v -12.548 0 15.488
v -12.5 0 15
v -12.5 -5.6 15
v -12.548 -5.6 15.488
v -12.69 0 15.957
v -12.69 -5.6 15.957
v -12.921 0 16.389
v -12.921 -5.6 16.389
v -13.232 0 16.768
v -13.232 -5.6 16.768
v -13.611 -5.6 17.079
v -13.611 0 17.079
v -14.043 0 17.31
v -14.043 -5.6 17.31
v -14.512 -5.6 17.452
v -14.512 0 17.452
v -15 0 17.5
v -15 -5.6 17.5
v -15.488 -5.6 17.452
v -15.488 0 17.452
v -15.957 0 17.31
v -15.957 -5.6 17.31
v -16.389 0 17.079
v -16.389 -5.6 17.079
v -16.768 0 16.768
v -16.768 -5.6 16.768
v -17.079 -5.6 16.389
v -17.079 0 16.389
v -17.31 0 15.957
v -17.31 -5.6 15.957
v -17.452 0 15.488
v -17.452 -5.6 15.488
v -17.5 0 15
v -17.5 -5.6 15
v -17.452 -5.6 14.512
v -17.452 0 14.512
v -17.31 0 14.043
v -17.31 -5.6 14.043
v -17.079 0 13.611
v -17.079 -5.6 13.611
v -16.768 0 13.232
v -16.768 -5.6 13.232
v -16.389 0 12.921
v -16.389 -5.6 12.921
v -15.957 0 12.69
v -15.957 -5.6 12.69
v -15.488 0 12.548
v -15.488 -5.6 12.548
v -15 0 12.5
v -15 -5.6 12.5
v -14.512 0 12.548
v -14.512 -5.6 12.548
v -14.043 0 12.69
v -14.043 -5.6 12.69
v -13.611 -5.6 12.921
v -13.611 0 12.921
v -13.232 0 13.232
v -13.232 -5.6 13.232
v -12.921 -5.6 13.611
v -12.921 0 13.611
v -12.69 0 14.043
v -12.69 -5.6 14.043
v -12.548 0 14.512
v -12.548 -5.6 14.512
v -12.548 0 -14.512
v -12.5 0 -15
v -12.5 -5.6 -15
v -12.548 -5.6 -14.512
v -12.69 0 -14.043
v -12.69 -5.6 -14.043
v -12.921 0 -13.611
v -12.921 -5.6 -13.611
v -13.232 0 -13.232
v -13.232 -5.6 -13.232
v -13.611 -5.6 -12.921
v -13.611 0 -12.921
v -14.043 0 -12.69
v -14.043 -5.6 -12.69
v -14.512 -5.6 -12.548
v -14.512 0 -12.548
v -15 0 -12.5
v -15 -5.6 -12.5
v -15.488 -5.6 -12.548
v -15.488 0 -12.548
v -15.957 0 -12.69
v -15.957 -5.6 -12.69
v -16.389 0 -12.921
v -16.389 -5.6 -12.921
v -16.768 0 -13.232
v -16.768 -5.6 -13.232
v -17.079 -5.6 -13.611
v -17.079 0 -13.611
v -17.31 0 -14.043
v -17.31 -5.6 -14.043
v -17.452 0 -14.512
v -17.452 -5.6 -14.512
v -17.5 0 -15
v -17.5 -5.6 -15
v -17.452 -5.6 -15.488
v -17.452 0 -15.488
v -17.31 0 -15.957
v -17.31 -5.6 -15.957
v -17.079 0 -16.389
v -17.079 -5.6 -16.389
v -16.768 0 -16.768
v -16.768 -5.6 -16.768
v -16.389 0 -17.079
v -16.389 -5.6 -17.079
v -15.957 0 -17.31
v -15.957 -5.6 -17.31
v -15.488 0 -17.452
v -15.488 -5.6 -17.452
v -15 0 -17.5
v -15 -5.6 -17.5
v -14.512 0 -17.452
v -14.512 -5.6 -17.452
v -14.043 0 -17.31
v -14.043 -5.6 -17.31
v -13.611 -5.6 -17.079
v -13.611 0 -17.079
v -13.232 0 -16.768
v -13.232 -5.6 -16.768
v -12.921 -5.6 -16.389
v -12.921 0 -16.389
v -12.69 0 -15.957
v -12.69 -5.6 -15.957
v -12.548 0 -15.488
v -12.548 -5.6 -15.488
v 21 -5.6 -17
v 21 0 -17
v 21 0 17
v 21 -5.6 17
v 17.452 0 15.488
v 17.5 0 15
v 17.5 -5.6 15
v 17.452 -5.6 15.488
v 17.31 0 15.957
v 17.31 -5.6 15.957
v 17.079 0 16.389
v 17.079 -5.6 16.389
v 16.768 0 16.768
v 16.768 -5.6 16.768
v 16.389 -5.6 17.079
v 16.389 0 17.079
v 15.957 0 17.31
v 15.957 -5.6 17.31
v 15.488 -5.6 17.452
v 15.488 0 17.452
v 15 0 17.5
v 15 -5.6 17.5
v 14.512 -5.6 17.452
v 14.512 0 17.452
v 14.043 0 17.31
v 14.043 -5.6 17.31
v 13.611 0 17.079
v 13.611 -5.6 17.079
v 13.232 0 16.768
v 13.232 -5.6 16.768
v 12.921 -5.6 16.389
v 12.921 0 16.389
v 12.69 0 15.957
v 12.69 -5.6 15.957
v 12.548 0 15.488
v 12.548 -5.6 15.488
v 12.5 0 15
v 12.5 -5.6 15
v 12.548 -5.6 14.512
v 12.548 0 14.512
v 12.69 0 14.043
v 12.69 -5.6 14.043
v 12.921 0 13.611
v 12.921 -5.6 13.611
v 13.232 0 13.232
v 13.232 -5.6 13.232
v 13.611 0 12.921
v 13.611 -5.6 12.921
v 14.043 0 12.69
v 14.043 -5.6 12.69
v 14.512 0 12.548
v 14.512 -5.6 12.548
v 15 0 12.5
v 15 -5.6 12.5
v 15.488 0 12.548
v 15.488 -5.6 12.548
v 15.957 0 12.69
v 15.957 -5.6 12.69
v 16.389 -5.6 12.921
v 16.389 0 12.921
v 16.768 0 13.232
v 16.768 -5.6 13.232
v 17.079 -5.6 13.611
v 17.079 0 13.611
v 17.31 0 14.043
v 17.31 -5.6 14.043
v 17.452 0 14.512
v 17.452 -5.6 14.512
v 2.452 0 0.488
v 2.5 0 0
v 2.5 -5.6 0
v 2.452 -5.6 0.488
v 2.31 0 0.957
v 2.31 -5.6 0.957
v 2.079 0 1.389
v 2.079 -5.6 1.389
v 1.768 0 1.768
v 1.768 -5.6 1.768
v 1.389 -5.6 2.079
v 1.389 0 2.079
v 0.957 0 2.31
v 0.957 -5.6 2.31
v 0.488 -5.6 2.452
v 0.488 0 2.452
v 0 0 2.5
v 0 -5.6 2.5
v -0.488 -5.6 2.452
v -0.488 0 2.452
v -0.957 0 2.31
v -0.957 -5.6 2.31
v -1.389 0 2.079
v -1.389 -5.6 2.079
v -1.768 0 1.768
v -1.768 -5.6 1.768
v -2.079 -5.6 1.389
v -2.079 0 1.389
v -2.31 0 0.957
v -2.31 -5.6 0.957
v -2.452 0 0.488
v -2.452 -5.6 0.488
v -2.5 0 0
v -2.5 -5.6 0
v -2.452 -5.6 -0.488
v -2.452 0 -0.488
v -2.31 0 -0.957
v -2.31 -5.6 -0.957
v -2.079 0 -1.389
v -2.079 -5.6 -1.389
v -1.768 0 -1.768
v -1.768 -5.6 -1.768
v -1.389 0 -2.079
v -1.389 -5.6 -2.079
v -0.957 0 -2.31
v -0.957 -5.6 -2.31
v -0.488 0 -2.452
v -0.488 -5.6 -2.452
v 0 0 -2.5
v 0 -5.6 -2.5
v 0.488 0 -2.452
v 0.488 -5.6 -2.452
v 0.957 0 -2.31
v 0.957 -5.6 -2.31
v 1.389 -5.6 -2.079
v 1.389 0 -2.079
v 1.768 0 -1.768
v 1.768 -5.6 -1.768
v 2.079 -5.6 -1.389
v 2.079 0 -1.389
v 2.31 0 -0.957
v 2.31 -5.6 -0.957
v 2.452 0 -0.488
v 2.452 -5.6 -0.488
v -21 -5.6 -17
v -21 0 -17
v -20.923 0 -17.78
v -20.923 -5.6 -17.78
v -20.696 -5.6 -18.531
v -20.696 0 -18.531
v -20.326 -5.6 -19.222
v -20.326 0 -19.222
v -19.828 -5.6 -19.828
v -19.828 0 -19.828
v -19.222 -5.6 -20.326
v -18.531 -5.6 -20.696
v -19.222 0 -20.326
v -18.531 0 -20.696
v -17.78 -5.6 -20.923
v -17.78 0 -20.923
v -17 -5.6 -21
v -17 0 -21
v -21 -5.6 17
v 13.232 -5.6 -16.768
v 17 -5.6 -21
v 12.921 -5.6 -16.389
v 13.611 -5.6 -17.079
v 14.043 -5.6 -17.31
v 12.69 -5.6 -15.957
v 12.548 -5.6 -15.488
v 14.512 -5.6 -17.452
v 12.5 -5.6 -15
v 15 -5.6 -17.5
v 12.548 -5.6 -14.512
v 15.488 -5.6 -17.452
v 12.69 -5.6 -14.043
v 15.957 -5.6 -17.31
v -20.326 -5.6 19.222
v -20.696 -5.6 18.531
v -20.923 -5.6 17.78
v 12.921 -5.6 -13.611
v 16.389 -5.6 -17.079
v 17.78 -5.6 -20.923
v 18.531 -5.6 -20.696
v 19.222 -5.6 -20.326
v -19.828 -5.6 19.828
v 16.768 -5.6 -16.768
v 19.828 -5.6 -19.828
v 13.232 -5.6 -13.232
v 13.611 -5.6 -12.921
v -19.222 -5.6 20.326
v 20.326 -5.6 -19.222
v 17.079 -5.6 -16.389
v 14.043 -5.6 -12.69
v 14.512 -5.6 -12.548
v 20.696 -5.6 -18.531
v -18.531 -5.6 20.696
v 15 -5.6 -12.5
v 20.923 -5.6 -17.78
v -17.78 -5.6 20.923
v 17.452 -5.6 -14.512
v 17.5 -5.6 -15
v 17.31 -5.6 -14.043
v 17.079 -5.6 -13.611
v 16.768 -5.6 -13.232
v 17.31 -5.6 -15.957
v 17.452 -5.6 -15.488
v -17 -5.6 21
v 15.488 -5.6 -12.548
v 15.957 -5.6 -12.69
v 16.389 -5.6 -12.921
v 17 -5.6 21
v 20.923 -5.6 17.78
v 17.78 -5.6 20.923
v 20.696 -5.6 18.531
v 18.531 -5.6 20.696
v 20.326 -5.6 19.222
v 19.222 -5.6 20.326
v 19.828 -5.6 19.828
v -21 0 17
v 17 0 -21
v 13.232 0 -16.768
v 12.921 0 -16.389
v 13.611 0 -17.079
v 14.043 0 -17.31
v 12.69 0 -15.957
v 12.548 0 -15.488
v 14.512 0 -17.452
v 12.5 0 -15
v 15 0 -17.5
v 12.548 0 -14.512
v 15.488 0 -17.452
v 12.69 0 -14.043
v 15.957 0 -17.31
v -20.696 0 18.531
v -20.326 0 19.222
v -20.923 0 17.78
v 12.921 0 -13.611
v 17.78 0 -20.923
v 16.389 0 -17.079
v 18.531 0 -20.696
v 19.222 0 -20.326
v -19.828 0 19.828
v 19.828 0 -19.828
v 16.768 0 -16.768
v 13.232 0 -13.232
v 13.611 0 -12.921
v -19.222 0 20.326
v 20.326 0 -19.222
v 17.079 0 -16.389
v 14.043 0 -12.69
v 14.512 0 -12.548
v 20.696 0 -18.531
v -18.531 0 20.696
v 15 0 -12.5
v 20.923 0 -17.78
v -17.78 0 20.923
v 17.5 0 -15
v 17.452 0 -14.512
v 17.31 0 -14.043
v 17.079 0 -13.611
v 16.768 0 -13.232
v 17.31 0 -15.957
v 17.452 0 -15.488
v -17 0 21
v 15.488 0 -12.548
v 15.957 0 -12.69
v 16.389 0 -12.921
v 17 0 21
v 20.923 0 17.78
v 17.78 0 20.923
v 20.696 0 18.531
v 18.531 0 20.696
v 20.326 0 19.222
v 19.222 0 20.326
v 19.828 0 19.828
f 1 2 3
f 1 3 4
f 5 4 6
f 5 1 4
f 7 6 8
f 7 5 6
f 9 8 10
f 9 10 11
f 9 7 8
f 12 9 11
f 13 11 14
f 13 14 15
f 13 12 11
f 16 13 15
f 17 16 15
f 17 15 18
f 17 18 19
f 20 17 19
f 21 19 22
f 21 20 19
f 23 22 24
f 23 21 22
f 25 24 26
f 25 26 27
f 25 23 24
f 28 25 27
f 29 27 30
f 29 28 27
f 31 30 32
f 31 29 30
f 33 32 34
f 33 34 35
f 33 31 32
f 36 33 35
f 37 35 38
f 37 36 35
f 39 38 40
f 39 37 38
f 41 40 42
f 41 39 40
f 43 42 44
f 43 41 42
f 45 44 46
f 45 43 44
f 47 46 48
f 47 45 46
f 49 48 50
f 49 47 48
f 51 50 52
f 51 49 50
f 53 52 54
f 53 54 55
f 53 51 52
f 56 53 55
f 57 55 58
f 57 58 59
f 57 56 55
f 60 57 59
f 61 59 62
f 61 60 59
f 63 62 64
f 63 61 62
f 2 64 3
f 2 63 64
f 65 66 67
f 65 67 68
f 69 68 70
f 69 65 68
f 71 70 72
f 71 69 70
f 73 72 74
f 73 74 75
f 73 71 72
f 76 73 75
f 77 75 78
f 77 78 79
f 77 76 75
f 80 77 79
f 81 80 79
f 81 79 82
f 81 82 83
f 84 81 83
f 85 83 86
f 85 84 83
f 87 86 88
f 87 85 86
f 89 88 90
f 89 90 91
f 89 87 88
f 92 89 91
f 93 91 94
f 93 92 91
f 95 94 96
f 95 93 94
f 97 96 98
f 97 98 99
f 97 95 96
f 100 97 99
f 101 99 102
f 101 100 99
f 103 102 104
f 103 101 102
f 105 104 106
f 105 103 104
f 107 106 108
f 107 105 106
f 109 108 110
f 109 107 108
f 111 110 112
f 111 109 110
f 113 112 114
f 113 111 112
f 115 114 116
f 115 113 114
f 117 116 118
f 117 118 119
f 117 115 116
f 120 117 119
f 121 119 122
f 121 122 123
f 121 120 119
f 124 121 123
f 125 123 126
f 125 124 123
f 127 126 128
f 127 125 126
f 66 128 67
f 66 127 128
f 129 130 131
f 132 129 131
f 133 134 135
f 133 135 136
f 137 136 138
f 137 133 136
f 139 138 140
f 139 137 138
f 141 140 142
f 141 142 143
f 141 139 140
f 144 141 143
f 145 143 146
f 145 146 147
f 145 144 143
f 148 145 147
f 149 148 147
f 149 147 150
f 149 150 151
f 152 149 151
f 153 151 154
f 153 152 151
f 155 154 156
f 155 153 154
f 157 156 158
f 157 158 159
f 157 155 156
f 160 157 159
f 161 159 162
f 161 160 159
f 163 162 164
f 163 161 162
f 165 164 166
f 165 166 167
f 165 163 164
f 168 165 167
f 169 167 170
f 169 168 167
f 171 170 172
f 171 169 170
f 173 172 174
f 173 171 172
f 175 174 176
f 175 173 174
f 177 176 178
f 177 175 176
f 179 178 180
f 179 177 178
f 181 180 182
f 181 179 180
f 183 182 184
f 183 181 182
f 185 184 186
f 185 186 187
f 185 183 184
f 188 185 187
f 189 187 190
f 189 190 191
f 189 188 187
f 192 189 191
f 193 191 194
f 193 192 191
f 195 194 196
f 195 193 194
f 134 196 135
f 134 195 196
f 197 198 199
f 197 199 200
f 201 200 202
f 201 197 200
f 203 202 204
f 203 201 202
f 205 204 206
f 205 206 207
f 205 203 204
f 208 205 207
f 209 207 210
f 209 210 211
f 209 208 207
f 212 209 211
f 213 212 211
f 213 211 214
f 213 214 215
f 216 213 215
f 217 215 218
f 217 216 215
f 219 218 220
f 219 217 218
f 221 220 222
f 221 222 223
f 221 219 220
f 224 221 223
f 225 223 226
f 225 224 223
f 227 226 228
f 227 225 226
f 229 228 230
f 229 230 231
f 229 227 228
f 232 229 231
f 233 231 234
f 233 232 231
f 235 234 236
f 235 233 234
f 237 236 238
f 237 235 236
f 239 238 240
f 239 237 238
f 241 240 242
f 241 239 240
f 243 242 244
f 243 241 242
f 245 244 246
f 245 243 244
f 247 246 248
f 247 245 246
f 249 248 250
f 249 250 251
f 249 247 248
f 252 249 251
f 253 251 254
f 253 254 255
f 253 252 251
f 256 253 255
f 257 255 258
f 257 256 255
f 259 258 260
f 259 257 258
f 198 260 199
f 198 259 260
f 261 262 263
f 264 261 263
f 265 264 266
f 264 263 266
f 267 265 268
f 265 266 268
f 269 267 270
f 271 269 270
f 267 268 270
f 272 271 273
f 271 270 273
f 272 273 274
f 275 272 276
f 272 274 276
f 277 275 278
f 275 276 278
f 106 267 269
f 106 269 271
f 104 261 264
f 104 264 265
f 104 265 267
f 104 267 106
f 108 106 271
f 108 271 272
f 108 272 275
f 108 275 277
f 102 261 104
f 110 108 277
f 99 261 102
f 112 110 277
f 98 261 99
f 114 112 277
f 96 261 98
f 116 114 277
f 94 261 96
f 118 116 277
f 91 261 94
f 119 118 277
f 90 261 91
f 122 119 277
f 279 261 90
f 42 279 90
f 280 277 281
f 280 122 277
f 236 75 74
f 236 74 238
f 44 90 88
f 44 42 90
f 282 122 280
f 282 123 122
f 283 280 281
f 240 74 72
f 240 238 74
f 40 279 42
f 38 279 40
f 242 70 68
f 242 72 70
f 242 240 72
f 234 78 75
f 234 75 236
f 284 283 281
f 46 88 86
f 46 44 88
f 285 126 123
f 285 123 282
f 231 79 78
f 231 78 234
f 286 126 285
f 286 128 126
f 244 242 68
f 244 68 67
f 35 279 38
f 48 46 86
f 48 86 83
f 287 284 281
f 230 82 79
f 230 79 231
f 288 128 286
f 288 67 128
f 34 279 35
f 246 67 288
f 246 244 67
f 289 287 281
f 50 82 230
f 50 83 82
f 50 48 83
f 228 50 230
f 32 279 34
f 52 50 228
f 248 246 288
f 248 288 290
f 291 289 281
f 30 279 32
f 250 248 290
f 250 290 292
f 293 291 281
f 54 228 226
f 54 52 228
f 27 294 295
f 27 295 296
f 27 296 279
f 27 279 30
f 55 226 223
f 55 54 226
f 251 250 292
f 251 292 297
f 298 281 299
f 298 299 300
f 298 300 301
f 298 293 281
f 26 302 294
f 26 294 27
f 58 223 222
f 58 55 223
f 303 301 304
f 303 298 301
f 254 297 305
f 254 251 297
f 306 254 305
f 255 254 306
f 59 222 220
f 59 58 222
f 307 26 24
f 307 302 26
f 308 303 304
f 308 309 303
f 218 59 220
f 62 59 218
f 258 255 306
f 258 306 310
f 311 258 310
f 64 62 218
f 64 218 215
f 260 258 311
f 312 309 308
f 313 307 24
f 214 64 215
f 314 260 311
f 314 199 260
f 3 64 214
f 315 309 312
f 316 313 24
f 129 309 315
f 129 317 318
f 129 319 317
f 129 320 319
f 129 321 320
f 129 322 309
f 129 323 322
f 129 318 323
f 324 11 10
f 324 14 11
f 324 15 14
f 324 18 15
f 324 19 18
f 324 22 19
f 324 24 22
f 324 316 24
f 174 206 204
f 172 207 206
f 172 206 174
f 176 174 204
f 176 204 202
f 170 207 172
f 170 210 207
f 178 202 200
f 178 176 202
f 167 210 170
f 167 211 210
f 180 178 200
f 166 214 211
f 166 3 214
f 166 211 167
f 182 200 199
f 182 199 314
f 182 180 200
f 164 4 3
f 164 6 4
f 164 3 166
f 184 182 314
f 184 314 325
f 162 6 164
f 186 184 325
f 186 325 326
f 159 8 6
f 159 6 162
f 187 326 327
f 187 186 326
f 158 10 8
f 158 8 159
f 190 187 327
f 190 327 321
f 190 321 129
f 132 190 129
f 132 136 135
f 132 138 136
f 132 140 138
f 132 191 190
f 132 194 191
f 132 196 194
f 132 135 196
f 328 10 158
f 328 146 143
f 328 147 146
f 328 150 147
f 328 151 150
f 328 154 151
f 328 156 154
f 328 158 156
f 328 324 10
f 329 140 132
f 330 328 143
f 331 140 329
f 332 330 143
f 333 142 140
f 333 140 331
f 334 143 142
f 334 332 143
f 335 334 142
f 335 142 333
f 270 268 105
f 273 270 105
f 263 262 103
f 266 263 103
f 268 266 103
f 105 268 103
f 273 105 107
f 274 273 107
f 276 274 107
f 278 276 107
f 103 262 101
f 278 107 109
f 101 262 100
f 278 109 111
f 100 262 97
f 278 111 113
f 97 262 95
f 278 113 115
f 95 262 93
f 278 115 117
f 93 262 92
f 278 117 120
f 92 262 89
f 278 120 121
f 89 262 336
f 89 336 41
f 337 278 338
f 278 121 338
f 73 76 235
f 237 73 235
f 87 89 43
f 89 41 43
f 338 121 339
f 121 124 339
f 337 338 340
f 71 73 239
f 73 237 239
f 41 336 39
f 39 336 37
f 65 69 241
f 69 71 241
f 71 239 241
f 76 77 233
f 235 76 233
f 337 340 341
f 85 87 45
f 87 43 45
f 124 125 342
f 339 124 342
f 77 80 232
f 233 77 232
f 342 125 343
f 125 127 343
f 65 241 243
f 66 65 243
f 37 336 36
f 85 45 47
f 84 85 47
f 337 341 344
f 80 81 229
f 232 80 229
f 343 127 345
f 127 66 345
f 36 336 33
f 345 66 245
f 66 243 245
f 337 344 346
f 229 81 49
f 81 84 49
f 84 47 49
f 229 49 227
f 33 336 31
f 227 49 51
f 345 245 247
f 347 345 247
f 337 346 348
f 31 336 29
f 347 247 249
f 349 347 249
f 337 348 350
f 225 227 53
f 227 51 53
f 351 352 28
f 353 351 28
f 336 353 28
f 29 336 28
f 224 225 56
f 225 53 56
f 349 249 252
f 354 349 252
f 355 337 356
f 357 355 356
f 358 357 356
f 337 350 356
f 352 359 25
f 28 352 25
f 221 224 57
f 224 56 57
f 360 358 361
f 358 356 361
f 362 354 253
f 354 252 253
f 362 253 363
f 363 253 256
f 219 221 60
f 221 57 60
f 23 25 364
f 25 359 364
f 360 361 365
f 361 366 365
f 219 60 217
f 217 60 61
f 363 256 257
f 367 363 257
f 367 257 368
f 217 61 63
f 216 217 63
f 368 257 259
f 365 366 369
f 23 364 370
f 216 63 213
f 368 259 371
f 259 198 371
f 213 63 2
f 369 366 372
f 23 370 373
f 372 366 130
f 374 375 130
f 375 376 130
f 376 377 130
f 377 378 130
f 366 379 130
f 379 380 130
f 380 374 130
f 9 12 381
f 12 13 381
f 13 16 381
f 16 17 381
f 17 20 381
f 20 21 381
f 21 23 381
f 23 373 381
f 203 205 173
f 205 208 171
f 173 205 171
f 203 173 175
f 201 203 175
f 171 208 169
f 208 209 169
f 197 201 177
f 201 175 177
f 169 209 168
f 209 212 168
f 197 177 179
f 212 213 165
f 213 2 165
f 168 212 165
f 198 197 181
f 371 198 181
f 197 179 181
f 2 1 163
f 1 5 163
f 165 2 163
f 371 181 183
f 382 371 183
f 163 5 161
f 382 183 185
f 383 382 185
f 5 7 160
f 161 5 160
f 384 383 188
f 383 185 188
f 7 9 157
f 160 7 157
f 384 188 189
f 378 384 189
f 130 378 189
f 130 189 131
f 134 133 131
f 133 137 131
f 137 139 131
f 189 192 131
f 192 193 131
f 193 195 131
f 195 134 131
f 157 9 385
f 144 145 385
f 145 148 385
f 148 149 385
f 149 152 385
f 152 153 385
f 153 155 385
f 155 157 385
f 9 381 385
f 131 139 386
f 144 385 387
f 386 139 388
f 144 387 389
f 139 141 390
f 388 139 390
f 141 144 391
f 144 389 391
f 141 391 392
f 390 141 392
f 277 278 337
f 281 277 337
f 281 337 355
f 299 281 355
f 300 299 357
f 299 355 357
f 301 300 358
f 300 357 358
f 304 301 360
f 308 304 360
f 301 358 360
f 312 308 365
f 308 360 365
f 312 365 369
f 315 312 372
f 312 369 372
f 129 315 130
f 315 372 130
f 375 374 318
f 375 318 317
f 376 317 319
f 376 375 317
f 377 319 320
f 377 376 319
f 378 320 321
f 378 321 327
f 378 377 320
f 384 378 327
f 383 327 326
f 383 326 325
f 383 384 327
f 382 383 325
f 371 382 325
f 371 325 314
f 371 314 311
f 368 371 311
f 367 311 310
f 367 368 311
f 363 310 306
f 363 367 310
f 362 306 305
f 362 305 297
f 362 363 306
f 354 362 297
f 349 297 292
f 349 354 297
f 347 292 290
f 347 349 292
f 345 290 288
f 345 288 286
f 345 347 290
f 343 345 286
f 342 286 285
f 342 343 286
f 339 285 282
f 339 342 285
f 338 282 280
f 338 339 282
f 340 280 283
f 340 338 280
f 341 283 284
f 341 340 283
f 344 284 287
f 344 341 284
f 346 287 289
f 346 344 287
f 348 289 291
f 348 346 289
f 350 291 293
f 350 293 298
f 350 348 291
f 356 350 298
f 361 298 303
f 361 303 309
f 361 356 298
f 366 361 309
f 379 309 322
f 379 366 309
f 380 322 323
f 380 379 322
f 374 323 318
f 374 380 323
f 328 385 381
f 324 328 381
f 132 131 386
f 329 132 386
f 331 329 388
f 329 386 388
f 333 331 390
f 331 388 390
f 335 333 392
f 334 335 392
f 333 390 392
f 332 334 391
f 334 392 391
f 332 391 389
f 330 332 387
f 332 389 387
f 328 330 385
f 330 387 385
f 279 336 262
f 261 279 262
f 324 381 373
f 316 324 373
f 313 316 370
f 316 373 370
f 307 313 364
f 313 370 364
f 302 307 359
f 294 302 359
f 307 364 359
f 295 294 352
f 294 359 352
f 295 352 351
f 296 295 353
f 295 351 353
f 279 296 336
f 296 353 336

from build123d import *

# Parameters (mm, degrees)
F0_R     = 2.5
F1_DEPTH = 5.6


with BuildPart() as f1:
    # F0 (on Front) → F1 (new body)
    with BuildSketch(Plane.XZ):
        with BuildLine():
            ThreePointArc((21, 17), (19.828427, 19.828427), (17, 21))
            Line((17, 21), (-17, 21))
            ThreePointArc((-17, 21), (-19.828427, 19.828427), (-21, 17))
            Line((-21, 17), (-21, -17))
            ThreePointArc((-21, -17), (-19.828427, -19.828427), (-17, -21))
            Line((-17, -21), (17, -21))
            ThreePointArc((17, -21), (19.828427, -19.828427), (21, -17))
            Line((21, -17), (21, 17))
        make_face()
        with Locations((-15, -15)):
            Circle(F0_R, mode=Mode.SUBTRACT)
        with Locations((15, -15)):
            Circle(F0_R, mode=Mode.SUBTRACT)
        with Locations((-15, 15)):
            Circle(F0_R, mode=Mode.SUBTRACT)
        Circle(F0_R, mode=Mode.SUBTRACT)
        with Locations((15, 15)):
            Circle(F0_R, mode=Mode.SUBTRACT)
    extrude(amount=F1_DEPTH)


solid = f1.part
